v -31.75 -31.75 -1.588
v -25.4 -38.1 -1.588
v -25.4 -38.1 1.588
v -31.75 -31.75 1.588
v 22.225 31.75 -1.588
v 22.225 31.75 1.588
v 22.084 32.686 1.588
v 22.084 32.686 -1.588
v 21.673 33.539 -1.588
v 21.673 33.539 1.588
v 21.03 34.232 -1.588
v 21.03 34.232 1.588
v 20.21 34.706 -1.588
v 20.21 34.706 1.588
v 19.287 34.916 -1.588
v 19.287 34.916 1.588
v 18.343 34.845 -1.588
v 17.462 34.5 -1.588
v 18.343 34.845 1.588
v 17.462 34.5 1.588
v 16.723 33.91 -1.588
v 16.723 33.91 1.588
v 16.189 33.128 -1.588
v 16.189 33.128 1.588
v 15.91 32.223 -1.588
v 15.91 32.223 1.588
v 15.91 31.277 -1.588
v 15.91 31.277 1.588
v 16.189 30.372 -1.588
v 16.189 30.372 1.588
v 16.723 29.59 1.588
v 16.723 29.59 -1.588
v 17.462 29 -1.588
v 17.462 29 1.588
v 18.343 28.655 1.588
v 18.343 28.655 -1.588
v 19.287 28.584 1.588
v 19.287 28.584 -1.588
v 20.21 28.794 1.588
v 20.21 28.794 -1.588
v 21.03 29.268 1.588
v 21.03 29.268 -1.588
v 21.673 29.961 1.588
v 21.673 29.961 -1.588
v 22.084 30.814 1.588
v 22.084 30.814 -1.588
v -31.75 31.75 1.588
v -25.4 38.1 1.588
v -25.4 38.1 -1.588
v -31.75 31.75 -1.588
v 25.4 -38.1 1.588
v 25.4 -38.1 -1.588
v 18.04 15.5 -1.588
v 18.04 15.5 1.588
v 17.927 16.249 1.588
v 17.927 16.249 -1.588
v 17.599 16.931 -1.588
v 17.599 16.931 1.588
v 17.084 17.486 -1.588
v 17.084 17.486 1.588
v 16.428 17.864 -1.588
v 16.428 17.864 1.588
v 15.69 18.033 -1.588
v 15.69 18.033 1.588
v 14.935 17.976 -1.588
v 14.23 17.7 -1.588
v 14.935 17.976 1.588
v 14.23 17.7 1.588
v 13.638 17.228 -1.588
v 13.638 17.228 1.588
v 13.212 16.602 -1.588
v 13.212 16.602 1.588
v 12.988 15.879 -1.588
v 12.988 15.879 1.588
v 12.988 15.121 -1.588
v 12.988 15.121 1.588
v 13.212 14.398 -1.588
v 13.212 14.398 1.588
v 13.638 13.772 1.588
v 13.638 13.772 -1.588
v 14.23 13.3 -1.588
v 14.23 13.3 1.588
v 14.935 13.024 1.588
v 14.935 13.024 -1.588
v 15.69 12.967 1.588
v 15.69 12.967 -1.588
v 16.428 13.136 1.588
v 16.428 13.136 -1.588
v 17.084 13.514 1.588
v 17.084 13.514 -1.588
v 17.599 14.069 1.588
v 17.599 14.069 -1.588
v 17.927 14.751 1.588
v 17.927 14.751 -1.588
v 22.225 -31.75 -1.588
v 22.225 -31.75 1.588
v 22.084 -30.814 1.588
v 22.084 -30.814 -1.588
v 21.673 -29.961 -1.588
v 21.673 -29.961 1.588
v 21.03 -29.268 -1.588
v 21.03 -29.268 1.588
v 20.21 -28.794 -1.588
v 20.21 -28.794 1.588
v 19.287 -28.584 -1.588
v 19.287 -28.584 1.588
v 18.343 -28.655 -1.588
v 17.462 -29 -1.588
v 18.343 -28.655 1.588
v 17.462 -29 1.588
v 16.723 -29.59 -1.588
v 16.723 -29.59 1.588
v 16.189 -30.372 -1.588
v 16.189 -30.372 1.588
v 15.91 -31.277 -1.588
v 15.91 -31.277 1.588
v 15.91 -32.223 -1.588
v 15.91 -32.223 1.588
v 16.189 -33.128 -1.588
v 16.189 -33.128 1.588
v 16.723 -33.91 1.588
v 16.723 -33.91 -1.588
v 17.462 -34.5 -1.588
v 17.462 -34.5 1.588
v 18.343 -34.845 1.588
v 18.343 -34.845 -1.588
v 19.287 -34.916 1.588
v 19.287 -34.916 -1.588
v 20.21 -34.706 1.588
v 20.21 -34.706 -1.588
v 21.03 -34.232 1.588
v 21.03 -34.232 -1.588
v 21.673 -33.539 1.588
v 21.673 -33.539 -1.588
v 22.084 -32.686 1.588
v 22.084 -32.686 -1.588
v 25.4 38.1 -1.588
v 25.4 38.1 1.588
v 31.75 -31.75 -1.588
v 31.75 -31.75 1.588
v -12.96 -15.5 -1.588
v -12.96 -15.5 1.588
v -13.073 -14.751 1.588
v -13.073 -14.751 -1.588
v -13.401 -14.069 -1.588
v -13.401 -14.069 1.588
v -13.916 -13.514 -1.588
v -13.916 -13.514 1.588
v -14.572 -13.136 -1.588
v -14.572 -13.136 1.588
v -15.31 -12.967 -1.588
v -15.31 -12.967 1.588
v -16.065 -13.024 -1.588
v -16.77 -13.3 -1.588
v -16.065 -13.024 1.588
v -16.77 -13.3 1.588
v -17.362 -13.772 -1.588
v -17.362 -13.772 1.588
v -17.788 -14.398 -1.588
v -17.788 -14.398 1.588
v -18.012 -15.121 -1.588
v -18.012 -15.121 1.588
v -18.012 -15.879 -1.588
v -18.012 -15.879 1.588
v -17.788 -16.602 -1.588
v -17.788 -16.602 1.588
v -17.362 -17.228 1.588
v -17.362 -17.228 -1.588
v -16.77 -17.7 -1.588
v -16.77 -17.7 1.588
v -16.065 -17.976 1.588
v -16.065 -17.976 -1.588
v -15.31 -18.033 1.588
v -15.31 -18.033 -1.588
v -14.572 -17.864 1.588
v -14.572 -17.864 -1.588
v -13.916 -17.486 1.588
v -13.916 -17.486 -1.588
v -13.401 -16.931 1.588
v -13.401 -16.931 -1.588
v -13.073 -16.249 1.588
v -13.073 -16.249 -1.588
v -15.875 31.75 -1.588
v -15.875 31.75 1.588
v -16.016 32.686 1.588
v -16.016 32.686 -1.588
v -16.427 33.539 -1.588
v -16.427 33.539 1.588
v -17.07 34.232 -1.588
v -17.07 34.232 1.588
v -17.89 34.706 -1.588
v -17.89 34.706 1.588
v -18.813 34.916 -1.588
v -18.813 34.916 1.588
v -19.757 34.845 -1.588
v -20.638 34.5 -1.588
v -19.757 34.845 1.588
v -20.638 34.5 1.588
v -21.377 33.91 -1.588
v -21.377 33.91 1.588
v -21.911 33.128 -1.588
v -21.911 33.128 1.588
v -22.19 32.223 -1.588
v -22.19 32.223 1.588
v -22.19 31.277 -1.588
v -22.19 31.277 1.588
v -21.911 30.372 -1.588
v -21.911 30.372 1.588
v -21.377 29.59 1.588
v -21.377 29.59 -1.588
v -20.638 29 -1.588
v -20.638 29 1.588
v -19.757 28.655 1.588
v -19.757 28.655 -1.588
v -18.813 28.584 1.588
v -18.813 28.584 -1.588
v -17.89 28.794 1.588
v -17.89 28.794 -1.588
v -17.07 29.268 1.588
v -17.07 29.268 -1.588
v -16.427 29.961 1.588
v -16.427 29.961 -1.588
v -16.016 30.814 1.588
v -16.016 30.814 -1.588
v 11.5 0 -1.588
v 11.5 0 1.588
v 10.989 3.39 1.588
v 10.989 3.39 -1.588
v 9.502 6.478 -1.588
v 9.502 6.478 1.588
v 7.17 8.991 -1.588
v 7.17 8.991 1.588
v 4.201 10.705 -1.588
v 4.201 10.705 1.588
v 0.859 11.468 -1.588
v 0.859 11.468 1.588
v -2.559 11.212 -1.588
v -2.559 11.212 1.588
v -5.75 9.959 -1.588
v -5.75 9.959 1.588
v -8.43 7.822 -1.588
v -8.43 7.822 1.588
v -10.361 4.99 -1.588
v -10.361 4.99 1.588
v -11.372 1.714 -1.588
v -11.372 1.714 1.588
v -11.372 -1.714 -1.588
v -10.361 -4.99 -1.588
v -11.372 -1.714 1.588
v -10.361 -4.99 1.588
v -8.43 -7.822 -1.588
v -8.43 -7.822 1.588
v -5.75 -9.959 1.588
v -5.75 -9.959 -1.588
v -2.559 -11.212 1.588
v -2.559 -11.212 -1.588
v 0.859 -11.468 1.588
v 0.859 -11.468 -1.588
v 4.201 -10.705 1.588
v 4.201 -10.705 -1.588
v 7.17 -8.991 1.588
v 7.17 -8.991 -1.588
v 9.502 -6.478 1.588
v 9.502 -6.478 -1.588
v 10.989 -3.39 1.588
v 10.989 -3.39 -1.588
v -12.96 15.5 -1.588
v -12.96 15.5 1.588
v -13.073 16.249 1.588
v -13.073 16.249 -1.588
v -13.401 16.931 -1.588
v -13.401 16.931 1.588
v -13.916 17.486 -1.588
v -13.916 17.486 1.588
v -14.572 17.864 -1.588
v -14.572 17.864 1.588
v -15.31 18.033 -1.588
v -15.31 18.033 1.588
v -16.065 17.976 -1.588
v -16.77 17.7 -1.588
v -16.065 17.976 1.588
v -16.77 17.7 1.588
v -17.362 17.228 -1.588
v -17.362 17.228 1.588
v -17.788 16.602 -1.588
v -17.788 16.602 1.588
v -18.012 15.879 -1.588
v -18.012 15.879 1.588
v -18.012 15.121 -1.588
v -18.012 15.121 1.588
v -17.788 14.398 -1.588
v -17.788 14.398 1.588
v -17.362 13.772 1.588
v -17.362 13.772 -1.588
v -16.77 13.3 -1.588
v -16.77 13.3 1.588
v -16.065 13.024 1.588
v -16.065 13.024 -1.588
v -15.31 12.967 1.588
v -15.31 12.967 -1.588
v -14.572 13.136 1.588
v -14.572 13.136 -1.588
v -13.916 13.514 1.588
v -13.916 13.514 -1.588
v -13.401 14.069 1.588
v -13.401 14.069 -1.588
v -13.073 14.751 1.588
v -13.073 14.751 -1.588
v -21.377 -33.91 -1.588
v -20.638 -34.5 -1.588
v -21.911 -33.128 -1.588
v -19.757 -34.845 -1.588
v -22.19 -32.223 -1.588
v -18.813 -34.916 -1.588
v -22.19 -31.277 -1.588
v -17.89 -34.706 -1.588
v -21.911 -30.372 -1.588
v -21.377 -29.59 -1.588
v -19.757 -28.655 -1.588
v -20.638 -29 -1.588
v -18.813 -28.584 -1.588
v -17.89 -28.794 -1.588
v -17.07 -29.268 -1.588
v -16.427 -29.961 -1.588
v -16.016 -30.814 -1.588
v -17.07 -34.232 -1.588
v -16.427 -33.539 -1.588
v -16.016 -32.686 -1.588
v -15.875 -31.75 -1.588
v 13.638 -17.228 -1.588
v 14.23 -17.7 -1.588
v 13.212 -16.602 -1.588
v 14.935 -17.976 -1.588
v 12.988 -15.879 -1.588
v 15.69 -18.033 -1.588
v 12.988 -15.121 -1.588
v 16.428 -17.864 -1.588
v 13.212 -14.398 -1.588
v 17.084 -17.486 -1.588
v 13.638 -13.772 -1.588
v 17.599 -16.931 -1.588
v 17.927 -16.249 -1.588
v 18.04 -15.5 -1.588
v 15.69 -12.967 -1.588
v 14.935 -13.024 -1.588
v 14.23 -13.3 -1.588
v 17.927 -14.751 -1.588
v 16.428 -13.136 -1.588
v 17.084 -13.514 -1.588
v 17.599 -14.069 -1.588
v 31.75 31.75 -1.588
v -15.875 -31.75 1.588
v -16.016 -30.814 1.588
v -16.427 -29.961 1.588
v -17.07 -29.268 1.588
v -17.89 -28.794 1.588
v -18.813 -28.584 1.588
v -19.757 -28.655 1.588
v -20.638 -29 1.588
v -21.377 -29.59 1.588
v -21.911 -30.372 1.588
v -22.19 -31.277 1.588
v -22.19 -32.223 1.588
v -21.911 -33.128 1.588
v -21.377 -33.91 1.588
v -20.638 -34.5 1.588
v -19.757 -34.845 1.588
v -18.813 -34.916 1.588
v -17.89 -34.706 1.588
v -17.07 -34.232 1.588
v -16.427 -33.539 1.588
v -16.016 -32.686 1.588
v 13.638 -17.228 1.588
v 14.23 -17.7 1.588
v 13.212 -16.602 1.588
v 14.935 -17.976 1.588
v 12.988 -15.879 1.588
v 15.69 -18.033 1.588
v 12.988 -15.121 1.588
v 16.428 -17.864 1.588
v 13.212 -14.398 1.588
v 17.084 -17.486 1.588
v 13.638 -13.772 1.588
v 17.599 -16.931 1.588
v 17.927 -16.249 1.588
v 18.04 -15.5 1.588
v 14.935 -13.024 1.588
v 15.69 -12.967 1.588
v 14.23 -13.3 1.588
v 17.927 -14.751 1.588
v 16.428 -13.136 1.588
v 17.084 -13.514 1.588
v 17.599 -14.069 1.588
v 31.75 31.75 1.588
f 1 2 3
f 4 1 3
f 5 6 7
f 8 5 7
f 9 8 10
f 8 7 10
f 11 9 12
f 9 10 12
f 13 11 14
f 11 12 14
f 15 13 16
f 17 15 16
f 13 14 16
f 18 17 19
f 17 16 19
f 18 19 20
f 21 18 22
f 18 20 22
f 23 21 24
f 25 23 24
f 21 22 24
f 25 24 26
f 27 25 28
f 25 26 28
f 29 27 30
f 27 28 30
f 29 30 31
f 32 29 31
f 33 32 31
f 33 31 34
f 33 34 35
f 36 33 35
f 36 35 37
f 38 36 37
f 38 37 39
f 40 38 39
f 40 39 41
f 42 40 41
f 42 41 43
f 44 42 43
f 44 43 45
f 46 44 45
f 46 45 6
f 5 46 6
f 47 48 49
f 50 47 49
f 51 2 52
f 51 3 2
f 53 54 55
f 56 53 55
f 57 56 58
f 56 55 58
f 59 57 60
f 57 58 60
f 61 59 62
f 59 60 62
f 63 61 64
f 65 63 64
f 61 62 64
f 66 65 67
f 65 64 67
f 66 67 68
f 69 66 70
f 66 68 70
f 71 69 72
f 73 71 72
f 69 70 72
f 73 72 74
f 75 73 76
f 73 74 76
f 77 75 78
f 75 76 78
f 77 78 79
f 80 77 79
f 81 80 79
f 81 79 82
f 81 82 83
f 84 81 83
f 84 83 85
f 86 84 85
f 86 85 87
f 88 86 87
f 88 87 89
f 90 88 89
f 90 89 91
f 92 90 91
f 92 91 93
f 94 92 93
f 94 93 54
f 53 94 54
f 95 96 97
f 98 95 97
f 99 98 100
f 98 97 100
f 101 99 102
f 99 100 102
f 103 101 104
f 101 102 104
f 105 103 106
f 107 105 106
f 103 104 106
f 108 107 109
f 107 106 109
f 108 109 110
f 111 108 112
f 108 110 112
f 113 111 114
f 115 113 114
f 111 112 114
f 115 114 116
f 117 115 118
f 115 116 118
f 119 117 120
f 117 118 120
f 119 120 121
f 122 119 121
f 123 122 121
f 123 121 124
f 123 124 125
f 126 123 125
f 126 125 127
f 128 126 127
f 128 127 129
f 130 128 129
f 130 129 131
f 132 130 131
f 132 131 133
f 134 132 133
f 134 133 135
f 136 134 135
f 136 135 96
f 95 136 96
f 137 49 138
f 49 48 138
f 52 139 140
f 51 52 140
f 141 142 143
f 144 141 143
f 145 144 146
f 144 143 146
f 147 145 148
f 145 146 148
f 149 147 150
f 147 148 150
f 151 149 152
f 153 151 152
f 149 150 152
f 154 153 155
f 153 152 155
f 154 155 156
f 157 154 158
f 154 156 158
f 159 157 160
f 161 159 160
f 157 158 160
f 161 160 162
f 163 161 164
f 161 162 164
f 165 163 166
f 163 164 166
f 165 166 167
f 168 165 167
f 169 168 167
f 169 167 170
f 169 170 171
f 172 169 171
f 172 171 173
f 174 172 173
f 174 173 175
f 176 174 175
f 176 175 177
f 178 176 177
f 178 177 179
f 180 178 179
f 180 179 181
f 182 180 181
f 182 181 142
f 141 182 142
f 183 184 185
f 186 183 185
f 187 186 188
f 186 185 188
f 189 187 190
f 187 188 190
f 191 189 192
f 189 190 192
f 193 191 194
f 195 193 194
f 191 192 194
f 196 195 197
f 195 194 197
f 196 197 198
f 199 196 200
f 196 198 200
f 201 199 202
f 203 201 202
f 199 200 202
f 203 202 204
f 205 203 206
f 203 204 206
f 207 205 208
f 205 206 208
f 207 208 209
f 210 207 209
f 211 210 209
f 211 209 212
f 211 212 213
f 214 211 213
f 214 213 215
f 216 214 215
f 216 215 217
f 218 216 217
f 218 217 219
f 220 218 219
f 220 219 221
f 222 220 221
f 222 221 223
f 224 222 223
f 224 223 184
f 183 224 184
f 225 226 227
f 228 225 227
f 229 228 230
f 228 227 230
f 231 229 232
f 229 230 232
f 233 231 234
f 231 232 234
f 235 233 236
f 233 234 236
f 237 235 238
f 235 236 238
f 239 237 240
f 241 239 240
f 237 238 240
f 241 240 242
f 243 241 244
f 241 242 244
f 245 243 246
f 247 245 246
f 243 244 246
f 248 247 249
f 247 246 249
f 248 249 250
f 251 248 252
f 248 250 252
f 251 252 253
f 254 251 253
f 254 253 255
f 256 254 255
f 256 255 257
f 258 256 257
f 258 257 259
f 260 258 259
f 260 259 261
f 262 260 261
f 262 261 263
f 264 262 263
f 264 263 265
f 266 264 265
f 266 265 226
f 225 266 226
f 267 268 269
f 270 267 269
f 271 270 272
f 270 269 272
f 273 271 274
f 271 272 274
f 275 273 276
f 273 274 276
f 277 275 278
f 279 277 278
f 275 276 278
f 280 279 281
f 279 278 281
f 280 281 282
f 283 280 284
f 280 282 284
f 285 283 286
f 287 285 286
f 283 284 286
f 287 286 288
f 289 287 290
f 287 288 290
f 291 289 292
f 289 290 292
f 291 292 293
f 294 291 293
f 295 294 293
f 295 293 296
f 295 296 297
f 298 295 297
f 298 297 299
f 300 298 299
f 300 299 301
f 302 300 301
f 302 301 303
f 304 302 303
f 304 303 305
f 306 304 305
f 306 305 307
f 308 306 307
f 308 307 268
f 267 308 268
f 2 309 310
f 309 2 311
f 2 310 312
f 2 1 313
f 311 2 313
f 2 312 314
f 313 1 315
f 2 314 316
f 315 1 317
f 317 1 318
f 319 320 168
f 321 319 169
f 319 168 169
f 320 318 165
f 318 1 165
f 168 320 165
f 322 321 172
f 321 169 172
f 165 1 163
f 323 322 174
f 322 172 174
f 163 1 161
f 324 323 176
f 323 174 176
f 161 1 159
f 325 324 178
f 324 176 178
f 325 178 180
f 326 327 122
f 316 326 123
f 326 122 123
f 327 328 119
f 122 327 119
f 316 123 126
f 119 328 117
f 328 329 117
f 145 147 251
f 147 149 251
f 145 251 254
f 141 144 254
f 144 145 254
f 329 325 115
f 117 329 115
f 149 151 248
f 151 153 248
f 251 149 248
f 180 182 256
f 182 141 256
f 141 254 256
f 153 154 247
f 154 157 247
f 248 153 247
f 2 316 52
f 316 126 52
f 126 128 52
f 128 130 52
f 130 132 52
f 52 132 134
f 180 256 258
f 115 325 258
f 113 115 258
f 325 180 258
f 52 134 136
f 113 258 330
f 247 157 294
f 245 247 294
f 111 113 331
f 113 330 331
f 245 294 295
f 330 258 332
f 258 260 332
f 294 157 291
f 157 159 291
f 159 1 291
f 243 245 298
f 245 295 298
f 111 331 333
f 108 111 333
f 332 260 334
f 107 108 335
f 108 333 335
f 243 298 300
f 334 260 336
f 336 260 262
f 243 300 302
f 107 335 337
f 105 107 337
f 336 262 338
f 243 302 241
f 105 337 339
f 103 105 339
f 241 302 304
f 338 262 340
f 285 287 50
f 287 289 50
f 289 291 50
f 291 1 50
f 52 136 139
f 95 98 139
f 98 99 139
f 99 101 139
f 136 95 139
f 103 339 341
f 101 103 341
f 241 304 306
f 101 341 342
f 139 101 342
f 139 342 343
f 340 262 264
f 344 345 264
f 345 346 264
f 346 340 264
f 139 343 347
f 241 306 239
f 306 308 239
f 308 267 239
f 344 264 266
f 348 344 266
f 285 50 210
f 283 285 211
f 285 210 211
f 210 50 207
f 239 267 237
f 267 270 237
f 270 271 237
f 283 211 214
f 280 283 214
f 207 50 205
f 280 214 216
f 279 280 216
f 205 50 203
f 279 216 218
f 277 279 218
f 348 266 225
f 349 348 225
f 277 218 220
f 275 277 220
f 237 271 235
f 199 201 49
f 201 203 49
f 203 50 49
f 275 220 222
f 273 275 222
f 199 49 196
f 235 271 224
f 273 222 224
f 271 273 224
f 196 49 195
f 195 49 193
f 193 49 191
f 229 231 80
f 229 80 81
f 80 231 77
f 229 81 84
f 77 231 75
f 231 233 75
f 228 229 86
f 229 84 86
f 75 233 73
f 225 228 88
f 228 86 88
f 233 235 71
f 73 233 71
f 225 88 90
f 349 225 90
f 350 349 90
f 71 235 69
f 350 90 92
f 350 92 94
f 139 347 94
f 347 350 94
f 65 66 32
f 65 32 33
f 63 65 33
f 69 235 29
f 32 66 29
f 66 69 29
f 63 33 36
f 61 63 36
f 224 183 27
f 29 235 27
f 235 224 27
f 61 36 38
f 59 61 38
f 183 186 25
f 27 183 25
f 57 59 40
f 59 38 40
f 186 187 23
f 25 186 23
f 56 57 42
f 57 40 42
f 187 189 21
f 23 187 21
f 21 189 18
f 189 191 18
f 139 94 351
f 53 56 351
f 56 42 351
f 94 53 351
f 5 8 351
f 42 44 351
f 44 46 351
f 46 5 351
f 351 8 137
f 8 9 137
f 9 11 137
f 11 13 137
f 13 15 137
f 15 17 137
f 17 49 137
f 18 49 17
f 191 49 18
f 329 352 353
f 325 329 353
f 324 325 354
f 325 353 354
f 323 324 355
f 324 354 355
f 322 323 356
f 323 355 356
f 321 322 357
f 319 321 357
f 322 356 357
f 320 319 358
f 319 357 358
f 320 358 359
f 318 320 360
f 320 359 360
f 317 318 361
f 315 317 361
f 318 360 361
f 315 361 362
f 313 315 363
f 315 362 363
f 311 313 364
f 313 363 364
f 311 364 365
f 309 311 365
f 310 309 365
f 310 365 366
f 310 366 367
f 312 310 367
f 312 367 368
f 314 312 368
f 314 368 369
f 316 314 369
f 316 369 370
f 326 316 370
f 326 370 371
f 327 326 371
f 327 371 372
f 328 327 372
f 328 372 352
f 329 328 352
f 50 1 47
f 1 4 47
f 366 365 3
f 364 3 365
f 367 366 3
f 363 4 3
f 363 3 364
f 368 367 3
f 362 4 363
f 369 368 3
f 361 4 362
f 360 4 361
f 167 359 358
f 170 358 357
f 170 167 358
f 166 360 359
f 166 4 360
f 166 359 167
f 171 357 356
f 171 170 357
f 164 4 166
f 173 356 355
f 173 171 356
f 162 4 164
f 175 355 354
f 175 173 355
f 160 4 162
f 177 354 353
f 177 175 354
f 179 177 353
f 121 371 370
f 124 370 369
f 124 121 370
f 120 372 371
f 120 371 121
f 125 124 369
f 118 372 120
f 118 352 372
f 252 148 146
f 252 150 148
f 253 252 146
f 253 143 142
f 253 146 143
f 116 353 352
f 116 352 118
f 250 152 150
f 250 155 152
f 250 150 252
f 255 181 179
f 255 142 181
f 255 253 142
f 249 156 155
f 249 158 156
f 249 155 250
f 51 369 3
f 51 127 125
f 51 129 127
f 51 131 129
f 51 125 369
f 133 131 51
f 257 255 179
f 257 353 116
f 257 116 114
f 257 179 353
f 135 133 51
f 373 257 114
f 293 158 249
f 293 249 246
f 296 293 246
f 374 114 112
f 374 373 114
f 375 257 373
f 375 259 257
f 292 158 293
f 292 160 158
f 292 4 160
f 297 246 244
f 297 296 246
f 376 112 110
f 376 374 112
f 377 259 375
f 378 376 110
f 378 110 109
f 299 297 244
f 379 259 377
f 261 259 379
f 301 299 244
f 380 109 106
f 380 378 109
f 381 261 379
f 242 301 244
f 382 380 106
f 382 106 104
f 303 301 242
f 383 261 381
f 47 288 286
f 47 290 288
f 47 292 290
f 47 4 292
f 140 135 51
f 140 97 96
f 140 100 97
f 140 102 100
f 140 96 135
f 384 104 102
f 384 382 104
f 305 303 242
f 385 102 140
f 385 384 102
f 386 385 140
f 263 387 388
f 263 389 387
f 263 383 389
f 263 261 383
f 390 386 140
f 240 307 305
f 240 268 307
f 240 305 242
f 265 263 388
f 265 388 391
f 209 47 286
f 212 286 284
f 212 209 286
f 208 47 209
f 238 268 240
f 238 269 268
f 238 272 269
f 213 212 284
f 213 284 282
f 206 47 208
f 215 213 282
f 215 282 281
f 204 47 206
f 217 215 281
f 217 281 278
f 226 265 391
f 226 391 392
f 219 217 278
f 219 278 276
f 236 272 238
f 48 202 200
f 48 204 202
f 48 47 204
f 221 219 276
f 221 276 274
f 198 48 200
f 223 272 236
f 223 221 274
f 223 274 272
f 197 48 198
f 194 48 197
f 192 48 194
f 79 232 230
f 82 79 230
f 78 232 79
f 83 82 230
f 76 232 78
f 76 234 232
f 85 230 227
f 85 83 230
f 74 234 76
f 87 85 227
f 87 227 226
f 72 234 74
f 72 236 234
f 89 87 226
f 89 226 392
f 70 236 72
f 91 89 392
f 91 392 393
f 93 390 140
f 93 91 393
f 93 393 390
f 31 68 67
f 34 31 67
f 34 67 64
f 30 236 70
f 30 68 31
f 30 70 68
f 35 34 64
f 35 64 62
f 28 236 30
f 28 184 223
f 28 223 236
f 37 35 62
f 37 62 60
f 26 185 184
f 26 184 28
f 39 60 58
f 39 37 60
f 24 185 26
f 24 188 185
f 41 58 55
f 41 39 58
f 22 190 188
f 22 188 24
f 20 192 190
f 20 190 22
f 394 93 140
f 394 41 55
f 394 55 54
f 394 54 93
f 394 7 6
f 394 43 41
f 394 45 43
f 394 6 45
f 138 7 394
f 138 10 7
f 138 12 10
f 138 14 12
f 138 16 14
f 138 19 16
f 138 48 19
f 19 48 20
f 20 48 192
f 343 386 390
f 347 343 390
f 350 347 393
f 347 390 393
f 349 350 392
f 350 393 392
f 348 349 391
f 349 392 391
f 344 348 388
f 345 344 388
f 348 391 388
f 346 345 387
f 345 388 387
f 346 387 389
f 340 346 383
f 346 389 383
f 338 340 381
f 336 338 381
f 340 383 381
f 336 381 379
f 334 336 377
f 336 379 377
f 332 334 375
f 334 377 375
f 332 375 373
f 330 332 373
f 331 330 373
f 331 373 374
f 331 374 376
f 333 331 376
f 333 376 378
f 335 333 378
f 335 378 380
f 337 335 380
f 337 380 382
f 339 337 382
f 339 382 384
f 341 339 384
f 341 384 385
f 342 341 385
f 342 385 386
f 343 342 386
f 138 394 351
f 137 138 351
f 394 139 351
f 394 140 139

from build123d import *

# Parameters (mm, degrees)
SKETCH1_W           = 63.5
SKETCH1_H           = 76.2
BOSS_EXTRUDE1_DEPTH = 1.5875
SKETCH2_R           = 3.175
CUT_EXTRUDE1_DEPTH  = 4.175
SKETCH3_R           = 2.54
CUT_EXTRUDE2_DEPTH  = 4.175
CHAMFER1_SIZE       = 6.35
SKETCH4_R           = 11.5
CUT_EXTRUDE3_DEPTH  = 4.175


with BuildPart() as part:
    # Sketch1 → Boss-Extrude1 (new body, symmetric)
    with BuildSketch(Plane.XY):
        Rectangle(SKETCH1_W, SKETCH1_H)
    extrude(amount=BOSS_EXTRUDE1_DEPTH, both=True)

    # Sketch2 → Cut-Extrude1 (cut, through all)
    with BuildSketch(Plane.XY.offset(1.5875)):
        with Locations((-19.05, 31.75)):
            Circle(SKETCH2_R)
        with Locations((19.05, 31.75)):
            Circle(SKETCH2_R)
        with Locations((19.05, -31.75)):
            Circle(SKETCH2_R)
        with Locations((-19.05, -31.75)):
            Circle(SKETCH2_R)
    extrude(amount=-CUT_EXTRUDE1_DEPTH, mode=Mode.SUBTRACT)

    # Sketch3 → Cut-Extrude2 (cut, through all)
    with BuildSketch(Plane.XY.offset(1.5875)):
        with Locations((-15.5, 15.5)):
            Circle(SKETCH3_R)
        with Locations((15.5, 15.5)):
            Circle(SKETCH3_R)
        with Locations((15.5, -15.5)):
            Circle(SKETCH3_R)
        with Locations((-15.5, -15.5)):
            Circle(SKETCH3_R)
    extrude(amount=-CUT_EXTRUDE2_DEPTH, mode=Mode.SUBTRACT)

    # Chamfer1
    chamfer1_edges = [part.edges().sort_by_distance(p)[0] for p in [
        (31.75, -38.1, 0),
        (-31.75, -38.1, 0),
        (-31.75, 38.1, 0),
        (31.75, 38.1, 0),
    ]]
    chamfer(chamfer1_edges, length=CHAMFER1_SIZE)

    # Sketch4 → Cut-Extrude3 (cut, through all)
    with BuildSketch(Plane.XY.offset(1.5875)):
        Circle(SKETCH4_R)
    extrude(amount=-CUT_EXTRUDE3_DEPTH, mode=Mode.SUBTRACT)


solid = part.part
